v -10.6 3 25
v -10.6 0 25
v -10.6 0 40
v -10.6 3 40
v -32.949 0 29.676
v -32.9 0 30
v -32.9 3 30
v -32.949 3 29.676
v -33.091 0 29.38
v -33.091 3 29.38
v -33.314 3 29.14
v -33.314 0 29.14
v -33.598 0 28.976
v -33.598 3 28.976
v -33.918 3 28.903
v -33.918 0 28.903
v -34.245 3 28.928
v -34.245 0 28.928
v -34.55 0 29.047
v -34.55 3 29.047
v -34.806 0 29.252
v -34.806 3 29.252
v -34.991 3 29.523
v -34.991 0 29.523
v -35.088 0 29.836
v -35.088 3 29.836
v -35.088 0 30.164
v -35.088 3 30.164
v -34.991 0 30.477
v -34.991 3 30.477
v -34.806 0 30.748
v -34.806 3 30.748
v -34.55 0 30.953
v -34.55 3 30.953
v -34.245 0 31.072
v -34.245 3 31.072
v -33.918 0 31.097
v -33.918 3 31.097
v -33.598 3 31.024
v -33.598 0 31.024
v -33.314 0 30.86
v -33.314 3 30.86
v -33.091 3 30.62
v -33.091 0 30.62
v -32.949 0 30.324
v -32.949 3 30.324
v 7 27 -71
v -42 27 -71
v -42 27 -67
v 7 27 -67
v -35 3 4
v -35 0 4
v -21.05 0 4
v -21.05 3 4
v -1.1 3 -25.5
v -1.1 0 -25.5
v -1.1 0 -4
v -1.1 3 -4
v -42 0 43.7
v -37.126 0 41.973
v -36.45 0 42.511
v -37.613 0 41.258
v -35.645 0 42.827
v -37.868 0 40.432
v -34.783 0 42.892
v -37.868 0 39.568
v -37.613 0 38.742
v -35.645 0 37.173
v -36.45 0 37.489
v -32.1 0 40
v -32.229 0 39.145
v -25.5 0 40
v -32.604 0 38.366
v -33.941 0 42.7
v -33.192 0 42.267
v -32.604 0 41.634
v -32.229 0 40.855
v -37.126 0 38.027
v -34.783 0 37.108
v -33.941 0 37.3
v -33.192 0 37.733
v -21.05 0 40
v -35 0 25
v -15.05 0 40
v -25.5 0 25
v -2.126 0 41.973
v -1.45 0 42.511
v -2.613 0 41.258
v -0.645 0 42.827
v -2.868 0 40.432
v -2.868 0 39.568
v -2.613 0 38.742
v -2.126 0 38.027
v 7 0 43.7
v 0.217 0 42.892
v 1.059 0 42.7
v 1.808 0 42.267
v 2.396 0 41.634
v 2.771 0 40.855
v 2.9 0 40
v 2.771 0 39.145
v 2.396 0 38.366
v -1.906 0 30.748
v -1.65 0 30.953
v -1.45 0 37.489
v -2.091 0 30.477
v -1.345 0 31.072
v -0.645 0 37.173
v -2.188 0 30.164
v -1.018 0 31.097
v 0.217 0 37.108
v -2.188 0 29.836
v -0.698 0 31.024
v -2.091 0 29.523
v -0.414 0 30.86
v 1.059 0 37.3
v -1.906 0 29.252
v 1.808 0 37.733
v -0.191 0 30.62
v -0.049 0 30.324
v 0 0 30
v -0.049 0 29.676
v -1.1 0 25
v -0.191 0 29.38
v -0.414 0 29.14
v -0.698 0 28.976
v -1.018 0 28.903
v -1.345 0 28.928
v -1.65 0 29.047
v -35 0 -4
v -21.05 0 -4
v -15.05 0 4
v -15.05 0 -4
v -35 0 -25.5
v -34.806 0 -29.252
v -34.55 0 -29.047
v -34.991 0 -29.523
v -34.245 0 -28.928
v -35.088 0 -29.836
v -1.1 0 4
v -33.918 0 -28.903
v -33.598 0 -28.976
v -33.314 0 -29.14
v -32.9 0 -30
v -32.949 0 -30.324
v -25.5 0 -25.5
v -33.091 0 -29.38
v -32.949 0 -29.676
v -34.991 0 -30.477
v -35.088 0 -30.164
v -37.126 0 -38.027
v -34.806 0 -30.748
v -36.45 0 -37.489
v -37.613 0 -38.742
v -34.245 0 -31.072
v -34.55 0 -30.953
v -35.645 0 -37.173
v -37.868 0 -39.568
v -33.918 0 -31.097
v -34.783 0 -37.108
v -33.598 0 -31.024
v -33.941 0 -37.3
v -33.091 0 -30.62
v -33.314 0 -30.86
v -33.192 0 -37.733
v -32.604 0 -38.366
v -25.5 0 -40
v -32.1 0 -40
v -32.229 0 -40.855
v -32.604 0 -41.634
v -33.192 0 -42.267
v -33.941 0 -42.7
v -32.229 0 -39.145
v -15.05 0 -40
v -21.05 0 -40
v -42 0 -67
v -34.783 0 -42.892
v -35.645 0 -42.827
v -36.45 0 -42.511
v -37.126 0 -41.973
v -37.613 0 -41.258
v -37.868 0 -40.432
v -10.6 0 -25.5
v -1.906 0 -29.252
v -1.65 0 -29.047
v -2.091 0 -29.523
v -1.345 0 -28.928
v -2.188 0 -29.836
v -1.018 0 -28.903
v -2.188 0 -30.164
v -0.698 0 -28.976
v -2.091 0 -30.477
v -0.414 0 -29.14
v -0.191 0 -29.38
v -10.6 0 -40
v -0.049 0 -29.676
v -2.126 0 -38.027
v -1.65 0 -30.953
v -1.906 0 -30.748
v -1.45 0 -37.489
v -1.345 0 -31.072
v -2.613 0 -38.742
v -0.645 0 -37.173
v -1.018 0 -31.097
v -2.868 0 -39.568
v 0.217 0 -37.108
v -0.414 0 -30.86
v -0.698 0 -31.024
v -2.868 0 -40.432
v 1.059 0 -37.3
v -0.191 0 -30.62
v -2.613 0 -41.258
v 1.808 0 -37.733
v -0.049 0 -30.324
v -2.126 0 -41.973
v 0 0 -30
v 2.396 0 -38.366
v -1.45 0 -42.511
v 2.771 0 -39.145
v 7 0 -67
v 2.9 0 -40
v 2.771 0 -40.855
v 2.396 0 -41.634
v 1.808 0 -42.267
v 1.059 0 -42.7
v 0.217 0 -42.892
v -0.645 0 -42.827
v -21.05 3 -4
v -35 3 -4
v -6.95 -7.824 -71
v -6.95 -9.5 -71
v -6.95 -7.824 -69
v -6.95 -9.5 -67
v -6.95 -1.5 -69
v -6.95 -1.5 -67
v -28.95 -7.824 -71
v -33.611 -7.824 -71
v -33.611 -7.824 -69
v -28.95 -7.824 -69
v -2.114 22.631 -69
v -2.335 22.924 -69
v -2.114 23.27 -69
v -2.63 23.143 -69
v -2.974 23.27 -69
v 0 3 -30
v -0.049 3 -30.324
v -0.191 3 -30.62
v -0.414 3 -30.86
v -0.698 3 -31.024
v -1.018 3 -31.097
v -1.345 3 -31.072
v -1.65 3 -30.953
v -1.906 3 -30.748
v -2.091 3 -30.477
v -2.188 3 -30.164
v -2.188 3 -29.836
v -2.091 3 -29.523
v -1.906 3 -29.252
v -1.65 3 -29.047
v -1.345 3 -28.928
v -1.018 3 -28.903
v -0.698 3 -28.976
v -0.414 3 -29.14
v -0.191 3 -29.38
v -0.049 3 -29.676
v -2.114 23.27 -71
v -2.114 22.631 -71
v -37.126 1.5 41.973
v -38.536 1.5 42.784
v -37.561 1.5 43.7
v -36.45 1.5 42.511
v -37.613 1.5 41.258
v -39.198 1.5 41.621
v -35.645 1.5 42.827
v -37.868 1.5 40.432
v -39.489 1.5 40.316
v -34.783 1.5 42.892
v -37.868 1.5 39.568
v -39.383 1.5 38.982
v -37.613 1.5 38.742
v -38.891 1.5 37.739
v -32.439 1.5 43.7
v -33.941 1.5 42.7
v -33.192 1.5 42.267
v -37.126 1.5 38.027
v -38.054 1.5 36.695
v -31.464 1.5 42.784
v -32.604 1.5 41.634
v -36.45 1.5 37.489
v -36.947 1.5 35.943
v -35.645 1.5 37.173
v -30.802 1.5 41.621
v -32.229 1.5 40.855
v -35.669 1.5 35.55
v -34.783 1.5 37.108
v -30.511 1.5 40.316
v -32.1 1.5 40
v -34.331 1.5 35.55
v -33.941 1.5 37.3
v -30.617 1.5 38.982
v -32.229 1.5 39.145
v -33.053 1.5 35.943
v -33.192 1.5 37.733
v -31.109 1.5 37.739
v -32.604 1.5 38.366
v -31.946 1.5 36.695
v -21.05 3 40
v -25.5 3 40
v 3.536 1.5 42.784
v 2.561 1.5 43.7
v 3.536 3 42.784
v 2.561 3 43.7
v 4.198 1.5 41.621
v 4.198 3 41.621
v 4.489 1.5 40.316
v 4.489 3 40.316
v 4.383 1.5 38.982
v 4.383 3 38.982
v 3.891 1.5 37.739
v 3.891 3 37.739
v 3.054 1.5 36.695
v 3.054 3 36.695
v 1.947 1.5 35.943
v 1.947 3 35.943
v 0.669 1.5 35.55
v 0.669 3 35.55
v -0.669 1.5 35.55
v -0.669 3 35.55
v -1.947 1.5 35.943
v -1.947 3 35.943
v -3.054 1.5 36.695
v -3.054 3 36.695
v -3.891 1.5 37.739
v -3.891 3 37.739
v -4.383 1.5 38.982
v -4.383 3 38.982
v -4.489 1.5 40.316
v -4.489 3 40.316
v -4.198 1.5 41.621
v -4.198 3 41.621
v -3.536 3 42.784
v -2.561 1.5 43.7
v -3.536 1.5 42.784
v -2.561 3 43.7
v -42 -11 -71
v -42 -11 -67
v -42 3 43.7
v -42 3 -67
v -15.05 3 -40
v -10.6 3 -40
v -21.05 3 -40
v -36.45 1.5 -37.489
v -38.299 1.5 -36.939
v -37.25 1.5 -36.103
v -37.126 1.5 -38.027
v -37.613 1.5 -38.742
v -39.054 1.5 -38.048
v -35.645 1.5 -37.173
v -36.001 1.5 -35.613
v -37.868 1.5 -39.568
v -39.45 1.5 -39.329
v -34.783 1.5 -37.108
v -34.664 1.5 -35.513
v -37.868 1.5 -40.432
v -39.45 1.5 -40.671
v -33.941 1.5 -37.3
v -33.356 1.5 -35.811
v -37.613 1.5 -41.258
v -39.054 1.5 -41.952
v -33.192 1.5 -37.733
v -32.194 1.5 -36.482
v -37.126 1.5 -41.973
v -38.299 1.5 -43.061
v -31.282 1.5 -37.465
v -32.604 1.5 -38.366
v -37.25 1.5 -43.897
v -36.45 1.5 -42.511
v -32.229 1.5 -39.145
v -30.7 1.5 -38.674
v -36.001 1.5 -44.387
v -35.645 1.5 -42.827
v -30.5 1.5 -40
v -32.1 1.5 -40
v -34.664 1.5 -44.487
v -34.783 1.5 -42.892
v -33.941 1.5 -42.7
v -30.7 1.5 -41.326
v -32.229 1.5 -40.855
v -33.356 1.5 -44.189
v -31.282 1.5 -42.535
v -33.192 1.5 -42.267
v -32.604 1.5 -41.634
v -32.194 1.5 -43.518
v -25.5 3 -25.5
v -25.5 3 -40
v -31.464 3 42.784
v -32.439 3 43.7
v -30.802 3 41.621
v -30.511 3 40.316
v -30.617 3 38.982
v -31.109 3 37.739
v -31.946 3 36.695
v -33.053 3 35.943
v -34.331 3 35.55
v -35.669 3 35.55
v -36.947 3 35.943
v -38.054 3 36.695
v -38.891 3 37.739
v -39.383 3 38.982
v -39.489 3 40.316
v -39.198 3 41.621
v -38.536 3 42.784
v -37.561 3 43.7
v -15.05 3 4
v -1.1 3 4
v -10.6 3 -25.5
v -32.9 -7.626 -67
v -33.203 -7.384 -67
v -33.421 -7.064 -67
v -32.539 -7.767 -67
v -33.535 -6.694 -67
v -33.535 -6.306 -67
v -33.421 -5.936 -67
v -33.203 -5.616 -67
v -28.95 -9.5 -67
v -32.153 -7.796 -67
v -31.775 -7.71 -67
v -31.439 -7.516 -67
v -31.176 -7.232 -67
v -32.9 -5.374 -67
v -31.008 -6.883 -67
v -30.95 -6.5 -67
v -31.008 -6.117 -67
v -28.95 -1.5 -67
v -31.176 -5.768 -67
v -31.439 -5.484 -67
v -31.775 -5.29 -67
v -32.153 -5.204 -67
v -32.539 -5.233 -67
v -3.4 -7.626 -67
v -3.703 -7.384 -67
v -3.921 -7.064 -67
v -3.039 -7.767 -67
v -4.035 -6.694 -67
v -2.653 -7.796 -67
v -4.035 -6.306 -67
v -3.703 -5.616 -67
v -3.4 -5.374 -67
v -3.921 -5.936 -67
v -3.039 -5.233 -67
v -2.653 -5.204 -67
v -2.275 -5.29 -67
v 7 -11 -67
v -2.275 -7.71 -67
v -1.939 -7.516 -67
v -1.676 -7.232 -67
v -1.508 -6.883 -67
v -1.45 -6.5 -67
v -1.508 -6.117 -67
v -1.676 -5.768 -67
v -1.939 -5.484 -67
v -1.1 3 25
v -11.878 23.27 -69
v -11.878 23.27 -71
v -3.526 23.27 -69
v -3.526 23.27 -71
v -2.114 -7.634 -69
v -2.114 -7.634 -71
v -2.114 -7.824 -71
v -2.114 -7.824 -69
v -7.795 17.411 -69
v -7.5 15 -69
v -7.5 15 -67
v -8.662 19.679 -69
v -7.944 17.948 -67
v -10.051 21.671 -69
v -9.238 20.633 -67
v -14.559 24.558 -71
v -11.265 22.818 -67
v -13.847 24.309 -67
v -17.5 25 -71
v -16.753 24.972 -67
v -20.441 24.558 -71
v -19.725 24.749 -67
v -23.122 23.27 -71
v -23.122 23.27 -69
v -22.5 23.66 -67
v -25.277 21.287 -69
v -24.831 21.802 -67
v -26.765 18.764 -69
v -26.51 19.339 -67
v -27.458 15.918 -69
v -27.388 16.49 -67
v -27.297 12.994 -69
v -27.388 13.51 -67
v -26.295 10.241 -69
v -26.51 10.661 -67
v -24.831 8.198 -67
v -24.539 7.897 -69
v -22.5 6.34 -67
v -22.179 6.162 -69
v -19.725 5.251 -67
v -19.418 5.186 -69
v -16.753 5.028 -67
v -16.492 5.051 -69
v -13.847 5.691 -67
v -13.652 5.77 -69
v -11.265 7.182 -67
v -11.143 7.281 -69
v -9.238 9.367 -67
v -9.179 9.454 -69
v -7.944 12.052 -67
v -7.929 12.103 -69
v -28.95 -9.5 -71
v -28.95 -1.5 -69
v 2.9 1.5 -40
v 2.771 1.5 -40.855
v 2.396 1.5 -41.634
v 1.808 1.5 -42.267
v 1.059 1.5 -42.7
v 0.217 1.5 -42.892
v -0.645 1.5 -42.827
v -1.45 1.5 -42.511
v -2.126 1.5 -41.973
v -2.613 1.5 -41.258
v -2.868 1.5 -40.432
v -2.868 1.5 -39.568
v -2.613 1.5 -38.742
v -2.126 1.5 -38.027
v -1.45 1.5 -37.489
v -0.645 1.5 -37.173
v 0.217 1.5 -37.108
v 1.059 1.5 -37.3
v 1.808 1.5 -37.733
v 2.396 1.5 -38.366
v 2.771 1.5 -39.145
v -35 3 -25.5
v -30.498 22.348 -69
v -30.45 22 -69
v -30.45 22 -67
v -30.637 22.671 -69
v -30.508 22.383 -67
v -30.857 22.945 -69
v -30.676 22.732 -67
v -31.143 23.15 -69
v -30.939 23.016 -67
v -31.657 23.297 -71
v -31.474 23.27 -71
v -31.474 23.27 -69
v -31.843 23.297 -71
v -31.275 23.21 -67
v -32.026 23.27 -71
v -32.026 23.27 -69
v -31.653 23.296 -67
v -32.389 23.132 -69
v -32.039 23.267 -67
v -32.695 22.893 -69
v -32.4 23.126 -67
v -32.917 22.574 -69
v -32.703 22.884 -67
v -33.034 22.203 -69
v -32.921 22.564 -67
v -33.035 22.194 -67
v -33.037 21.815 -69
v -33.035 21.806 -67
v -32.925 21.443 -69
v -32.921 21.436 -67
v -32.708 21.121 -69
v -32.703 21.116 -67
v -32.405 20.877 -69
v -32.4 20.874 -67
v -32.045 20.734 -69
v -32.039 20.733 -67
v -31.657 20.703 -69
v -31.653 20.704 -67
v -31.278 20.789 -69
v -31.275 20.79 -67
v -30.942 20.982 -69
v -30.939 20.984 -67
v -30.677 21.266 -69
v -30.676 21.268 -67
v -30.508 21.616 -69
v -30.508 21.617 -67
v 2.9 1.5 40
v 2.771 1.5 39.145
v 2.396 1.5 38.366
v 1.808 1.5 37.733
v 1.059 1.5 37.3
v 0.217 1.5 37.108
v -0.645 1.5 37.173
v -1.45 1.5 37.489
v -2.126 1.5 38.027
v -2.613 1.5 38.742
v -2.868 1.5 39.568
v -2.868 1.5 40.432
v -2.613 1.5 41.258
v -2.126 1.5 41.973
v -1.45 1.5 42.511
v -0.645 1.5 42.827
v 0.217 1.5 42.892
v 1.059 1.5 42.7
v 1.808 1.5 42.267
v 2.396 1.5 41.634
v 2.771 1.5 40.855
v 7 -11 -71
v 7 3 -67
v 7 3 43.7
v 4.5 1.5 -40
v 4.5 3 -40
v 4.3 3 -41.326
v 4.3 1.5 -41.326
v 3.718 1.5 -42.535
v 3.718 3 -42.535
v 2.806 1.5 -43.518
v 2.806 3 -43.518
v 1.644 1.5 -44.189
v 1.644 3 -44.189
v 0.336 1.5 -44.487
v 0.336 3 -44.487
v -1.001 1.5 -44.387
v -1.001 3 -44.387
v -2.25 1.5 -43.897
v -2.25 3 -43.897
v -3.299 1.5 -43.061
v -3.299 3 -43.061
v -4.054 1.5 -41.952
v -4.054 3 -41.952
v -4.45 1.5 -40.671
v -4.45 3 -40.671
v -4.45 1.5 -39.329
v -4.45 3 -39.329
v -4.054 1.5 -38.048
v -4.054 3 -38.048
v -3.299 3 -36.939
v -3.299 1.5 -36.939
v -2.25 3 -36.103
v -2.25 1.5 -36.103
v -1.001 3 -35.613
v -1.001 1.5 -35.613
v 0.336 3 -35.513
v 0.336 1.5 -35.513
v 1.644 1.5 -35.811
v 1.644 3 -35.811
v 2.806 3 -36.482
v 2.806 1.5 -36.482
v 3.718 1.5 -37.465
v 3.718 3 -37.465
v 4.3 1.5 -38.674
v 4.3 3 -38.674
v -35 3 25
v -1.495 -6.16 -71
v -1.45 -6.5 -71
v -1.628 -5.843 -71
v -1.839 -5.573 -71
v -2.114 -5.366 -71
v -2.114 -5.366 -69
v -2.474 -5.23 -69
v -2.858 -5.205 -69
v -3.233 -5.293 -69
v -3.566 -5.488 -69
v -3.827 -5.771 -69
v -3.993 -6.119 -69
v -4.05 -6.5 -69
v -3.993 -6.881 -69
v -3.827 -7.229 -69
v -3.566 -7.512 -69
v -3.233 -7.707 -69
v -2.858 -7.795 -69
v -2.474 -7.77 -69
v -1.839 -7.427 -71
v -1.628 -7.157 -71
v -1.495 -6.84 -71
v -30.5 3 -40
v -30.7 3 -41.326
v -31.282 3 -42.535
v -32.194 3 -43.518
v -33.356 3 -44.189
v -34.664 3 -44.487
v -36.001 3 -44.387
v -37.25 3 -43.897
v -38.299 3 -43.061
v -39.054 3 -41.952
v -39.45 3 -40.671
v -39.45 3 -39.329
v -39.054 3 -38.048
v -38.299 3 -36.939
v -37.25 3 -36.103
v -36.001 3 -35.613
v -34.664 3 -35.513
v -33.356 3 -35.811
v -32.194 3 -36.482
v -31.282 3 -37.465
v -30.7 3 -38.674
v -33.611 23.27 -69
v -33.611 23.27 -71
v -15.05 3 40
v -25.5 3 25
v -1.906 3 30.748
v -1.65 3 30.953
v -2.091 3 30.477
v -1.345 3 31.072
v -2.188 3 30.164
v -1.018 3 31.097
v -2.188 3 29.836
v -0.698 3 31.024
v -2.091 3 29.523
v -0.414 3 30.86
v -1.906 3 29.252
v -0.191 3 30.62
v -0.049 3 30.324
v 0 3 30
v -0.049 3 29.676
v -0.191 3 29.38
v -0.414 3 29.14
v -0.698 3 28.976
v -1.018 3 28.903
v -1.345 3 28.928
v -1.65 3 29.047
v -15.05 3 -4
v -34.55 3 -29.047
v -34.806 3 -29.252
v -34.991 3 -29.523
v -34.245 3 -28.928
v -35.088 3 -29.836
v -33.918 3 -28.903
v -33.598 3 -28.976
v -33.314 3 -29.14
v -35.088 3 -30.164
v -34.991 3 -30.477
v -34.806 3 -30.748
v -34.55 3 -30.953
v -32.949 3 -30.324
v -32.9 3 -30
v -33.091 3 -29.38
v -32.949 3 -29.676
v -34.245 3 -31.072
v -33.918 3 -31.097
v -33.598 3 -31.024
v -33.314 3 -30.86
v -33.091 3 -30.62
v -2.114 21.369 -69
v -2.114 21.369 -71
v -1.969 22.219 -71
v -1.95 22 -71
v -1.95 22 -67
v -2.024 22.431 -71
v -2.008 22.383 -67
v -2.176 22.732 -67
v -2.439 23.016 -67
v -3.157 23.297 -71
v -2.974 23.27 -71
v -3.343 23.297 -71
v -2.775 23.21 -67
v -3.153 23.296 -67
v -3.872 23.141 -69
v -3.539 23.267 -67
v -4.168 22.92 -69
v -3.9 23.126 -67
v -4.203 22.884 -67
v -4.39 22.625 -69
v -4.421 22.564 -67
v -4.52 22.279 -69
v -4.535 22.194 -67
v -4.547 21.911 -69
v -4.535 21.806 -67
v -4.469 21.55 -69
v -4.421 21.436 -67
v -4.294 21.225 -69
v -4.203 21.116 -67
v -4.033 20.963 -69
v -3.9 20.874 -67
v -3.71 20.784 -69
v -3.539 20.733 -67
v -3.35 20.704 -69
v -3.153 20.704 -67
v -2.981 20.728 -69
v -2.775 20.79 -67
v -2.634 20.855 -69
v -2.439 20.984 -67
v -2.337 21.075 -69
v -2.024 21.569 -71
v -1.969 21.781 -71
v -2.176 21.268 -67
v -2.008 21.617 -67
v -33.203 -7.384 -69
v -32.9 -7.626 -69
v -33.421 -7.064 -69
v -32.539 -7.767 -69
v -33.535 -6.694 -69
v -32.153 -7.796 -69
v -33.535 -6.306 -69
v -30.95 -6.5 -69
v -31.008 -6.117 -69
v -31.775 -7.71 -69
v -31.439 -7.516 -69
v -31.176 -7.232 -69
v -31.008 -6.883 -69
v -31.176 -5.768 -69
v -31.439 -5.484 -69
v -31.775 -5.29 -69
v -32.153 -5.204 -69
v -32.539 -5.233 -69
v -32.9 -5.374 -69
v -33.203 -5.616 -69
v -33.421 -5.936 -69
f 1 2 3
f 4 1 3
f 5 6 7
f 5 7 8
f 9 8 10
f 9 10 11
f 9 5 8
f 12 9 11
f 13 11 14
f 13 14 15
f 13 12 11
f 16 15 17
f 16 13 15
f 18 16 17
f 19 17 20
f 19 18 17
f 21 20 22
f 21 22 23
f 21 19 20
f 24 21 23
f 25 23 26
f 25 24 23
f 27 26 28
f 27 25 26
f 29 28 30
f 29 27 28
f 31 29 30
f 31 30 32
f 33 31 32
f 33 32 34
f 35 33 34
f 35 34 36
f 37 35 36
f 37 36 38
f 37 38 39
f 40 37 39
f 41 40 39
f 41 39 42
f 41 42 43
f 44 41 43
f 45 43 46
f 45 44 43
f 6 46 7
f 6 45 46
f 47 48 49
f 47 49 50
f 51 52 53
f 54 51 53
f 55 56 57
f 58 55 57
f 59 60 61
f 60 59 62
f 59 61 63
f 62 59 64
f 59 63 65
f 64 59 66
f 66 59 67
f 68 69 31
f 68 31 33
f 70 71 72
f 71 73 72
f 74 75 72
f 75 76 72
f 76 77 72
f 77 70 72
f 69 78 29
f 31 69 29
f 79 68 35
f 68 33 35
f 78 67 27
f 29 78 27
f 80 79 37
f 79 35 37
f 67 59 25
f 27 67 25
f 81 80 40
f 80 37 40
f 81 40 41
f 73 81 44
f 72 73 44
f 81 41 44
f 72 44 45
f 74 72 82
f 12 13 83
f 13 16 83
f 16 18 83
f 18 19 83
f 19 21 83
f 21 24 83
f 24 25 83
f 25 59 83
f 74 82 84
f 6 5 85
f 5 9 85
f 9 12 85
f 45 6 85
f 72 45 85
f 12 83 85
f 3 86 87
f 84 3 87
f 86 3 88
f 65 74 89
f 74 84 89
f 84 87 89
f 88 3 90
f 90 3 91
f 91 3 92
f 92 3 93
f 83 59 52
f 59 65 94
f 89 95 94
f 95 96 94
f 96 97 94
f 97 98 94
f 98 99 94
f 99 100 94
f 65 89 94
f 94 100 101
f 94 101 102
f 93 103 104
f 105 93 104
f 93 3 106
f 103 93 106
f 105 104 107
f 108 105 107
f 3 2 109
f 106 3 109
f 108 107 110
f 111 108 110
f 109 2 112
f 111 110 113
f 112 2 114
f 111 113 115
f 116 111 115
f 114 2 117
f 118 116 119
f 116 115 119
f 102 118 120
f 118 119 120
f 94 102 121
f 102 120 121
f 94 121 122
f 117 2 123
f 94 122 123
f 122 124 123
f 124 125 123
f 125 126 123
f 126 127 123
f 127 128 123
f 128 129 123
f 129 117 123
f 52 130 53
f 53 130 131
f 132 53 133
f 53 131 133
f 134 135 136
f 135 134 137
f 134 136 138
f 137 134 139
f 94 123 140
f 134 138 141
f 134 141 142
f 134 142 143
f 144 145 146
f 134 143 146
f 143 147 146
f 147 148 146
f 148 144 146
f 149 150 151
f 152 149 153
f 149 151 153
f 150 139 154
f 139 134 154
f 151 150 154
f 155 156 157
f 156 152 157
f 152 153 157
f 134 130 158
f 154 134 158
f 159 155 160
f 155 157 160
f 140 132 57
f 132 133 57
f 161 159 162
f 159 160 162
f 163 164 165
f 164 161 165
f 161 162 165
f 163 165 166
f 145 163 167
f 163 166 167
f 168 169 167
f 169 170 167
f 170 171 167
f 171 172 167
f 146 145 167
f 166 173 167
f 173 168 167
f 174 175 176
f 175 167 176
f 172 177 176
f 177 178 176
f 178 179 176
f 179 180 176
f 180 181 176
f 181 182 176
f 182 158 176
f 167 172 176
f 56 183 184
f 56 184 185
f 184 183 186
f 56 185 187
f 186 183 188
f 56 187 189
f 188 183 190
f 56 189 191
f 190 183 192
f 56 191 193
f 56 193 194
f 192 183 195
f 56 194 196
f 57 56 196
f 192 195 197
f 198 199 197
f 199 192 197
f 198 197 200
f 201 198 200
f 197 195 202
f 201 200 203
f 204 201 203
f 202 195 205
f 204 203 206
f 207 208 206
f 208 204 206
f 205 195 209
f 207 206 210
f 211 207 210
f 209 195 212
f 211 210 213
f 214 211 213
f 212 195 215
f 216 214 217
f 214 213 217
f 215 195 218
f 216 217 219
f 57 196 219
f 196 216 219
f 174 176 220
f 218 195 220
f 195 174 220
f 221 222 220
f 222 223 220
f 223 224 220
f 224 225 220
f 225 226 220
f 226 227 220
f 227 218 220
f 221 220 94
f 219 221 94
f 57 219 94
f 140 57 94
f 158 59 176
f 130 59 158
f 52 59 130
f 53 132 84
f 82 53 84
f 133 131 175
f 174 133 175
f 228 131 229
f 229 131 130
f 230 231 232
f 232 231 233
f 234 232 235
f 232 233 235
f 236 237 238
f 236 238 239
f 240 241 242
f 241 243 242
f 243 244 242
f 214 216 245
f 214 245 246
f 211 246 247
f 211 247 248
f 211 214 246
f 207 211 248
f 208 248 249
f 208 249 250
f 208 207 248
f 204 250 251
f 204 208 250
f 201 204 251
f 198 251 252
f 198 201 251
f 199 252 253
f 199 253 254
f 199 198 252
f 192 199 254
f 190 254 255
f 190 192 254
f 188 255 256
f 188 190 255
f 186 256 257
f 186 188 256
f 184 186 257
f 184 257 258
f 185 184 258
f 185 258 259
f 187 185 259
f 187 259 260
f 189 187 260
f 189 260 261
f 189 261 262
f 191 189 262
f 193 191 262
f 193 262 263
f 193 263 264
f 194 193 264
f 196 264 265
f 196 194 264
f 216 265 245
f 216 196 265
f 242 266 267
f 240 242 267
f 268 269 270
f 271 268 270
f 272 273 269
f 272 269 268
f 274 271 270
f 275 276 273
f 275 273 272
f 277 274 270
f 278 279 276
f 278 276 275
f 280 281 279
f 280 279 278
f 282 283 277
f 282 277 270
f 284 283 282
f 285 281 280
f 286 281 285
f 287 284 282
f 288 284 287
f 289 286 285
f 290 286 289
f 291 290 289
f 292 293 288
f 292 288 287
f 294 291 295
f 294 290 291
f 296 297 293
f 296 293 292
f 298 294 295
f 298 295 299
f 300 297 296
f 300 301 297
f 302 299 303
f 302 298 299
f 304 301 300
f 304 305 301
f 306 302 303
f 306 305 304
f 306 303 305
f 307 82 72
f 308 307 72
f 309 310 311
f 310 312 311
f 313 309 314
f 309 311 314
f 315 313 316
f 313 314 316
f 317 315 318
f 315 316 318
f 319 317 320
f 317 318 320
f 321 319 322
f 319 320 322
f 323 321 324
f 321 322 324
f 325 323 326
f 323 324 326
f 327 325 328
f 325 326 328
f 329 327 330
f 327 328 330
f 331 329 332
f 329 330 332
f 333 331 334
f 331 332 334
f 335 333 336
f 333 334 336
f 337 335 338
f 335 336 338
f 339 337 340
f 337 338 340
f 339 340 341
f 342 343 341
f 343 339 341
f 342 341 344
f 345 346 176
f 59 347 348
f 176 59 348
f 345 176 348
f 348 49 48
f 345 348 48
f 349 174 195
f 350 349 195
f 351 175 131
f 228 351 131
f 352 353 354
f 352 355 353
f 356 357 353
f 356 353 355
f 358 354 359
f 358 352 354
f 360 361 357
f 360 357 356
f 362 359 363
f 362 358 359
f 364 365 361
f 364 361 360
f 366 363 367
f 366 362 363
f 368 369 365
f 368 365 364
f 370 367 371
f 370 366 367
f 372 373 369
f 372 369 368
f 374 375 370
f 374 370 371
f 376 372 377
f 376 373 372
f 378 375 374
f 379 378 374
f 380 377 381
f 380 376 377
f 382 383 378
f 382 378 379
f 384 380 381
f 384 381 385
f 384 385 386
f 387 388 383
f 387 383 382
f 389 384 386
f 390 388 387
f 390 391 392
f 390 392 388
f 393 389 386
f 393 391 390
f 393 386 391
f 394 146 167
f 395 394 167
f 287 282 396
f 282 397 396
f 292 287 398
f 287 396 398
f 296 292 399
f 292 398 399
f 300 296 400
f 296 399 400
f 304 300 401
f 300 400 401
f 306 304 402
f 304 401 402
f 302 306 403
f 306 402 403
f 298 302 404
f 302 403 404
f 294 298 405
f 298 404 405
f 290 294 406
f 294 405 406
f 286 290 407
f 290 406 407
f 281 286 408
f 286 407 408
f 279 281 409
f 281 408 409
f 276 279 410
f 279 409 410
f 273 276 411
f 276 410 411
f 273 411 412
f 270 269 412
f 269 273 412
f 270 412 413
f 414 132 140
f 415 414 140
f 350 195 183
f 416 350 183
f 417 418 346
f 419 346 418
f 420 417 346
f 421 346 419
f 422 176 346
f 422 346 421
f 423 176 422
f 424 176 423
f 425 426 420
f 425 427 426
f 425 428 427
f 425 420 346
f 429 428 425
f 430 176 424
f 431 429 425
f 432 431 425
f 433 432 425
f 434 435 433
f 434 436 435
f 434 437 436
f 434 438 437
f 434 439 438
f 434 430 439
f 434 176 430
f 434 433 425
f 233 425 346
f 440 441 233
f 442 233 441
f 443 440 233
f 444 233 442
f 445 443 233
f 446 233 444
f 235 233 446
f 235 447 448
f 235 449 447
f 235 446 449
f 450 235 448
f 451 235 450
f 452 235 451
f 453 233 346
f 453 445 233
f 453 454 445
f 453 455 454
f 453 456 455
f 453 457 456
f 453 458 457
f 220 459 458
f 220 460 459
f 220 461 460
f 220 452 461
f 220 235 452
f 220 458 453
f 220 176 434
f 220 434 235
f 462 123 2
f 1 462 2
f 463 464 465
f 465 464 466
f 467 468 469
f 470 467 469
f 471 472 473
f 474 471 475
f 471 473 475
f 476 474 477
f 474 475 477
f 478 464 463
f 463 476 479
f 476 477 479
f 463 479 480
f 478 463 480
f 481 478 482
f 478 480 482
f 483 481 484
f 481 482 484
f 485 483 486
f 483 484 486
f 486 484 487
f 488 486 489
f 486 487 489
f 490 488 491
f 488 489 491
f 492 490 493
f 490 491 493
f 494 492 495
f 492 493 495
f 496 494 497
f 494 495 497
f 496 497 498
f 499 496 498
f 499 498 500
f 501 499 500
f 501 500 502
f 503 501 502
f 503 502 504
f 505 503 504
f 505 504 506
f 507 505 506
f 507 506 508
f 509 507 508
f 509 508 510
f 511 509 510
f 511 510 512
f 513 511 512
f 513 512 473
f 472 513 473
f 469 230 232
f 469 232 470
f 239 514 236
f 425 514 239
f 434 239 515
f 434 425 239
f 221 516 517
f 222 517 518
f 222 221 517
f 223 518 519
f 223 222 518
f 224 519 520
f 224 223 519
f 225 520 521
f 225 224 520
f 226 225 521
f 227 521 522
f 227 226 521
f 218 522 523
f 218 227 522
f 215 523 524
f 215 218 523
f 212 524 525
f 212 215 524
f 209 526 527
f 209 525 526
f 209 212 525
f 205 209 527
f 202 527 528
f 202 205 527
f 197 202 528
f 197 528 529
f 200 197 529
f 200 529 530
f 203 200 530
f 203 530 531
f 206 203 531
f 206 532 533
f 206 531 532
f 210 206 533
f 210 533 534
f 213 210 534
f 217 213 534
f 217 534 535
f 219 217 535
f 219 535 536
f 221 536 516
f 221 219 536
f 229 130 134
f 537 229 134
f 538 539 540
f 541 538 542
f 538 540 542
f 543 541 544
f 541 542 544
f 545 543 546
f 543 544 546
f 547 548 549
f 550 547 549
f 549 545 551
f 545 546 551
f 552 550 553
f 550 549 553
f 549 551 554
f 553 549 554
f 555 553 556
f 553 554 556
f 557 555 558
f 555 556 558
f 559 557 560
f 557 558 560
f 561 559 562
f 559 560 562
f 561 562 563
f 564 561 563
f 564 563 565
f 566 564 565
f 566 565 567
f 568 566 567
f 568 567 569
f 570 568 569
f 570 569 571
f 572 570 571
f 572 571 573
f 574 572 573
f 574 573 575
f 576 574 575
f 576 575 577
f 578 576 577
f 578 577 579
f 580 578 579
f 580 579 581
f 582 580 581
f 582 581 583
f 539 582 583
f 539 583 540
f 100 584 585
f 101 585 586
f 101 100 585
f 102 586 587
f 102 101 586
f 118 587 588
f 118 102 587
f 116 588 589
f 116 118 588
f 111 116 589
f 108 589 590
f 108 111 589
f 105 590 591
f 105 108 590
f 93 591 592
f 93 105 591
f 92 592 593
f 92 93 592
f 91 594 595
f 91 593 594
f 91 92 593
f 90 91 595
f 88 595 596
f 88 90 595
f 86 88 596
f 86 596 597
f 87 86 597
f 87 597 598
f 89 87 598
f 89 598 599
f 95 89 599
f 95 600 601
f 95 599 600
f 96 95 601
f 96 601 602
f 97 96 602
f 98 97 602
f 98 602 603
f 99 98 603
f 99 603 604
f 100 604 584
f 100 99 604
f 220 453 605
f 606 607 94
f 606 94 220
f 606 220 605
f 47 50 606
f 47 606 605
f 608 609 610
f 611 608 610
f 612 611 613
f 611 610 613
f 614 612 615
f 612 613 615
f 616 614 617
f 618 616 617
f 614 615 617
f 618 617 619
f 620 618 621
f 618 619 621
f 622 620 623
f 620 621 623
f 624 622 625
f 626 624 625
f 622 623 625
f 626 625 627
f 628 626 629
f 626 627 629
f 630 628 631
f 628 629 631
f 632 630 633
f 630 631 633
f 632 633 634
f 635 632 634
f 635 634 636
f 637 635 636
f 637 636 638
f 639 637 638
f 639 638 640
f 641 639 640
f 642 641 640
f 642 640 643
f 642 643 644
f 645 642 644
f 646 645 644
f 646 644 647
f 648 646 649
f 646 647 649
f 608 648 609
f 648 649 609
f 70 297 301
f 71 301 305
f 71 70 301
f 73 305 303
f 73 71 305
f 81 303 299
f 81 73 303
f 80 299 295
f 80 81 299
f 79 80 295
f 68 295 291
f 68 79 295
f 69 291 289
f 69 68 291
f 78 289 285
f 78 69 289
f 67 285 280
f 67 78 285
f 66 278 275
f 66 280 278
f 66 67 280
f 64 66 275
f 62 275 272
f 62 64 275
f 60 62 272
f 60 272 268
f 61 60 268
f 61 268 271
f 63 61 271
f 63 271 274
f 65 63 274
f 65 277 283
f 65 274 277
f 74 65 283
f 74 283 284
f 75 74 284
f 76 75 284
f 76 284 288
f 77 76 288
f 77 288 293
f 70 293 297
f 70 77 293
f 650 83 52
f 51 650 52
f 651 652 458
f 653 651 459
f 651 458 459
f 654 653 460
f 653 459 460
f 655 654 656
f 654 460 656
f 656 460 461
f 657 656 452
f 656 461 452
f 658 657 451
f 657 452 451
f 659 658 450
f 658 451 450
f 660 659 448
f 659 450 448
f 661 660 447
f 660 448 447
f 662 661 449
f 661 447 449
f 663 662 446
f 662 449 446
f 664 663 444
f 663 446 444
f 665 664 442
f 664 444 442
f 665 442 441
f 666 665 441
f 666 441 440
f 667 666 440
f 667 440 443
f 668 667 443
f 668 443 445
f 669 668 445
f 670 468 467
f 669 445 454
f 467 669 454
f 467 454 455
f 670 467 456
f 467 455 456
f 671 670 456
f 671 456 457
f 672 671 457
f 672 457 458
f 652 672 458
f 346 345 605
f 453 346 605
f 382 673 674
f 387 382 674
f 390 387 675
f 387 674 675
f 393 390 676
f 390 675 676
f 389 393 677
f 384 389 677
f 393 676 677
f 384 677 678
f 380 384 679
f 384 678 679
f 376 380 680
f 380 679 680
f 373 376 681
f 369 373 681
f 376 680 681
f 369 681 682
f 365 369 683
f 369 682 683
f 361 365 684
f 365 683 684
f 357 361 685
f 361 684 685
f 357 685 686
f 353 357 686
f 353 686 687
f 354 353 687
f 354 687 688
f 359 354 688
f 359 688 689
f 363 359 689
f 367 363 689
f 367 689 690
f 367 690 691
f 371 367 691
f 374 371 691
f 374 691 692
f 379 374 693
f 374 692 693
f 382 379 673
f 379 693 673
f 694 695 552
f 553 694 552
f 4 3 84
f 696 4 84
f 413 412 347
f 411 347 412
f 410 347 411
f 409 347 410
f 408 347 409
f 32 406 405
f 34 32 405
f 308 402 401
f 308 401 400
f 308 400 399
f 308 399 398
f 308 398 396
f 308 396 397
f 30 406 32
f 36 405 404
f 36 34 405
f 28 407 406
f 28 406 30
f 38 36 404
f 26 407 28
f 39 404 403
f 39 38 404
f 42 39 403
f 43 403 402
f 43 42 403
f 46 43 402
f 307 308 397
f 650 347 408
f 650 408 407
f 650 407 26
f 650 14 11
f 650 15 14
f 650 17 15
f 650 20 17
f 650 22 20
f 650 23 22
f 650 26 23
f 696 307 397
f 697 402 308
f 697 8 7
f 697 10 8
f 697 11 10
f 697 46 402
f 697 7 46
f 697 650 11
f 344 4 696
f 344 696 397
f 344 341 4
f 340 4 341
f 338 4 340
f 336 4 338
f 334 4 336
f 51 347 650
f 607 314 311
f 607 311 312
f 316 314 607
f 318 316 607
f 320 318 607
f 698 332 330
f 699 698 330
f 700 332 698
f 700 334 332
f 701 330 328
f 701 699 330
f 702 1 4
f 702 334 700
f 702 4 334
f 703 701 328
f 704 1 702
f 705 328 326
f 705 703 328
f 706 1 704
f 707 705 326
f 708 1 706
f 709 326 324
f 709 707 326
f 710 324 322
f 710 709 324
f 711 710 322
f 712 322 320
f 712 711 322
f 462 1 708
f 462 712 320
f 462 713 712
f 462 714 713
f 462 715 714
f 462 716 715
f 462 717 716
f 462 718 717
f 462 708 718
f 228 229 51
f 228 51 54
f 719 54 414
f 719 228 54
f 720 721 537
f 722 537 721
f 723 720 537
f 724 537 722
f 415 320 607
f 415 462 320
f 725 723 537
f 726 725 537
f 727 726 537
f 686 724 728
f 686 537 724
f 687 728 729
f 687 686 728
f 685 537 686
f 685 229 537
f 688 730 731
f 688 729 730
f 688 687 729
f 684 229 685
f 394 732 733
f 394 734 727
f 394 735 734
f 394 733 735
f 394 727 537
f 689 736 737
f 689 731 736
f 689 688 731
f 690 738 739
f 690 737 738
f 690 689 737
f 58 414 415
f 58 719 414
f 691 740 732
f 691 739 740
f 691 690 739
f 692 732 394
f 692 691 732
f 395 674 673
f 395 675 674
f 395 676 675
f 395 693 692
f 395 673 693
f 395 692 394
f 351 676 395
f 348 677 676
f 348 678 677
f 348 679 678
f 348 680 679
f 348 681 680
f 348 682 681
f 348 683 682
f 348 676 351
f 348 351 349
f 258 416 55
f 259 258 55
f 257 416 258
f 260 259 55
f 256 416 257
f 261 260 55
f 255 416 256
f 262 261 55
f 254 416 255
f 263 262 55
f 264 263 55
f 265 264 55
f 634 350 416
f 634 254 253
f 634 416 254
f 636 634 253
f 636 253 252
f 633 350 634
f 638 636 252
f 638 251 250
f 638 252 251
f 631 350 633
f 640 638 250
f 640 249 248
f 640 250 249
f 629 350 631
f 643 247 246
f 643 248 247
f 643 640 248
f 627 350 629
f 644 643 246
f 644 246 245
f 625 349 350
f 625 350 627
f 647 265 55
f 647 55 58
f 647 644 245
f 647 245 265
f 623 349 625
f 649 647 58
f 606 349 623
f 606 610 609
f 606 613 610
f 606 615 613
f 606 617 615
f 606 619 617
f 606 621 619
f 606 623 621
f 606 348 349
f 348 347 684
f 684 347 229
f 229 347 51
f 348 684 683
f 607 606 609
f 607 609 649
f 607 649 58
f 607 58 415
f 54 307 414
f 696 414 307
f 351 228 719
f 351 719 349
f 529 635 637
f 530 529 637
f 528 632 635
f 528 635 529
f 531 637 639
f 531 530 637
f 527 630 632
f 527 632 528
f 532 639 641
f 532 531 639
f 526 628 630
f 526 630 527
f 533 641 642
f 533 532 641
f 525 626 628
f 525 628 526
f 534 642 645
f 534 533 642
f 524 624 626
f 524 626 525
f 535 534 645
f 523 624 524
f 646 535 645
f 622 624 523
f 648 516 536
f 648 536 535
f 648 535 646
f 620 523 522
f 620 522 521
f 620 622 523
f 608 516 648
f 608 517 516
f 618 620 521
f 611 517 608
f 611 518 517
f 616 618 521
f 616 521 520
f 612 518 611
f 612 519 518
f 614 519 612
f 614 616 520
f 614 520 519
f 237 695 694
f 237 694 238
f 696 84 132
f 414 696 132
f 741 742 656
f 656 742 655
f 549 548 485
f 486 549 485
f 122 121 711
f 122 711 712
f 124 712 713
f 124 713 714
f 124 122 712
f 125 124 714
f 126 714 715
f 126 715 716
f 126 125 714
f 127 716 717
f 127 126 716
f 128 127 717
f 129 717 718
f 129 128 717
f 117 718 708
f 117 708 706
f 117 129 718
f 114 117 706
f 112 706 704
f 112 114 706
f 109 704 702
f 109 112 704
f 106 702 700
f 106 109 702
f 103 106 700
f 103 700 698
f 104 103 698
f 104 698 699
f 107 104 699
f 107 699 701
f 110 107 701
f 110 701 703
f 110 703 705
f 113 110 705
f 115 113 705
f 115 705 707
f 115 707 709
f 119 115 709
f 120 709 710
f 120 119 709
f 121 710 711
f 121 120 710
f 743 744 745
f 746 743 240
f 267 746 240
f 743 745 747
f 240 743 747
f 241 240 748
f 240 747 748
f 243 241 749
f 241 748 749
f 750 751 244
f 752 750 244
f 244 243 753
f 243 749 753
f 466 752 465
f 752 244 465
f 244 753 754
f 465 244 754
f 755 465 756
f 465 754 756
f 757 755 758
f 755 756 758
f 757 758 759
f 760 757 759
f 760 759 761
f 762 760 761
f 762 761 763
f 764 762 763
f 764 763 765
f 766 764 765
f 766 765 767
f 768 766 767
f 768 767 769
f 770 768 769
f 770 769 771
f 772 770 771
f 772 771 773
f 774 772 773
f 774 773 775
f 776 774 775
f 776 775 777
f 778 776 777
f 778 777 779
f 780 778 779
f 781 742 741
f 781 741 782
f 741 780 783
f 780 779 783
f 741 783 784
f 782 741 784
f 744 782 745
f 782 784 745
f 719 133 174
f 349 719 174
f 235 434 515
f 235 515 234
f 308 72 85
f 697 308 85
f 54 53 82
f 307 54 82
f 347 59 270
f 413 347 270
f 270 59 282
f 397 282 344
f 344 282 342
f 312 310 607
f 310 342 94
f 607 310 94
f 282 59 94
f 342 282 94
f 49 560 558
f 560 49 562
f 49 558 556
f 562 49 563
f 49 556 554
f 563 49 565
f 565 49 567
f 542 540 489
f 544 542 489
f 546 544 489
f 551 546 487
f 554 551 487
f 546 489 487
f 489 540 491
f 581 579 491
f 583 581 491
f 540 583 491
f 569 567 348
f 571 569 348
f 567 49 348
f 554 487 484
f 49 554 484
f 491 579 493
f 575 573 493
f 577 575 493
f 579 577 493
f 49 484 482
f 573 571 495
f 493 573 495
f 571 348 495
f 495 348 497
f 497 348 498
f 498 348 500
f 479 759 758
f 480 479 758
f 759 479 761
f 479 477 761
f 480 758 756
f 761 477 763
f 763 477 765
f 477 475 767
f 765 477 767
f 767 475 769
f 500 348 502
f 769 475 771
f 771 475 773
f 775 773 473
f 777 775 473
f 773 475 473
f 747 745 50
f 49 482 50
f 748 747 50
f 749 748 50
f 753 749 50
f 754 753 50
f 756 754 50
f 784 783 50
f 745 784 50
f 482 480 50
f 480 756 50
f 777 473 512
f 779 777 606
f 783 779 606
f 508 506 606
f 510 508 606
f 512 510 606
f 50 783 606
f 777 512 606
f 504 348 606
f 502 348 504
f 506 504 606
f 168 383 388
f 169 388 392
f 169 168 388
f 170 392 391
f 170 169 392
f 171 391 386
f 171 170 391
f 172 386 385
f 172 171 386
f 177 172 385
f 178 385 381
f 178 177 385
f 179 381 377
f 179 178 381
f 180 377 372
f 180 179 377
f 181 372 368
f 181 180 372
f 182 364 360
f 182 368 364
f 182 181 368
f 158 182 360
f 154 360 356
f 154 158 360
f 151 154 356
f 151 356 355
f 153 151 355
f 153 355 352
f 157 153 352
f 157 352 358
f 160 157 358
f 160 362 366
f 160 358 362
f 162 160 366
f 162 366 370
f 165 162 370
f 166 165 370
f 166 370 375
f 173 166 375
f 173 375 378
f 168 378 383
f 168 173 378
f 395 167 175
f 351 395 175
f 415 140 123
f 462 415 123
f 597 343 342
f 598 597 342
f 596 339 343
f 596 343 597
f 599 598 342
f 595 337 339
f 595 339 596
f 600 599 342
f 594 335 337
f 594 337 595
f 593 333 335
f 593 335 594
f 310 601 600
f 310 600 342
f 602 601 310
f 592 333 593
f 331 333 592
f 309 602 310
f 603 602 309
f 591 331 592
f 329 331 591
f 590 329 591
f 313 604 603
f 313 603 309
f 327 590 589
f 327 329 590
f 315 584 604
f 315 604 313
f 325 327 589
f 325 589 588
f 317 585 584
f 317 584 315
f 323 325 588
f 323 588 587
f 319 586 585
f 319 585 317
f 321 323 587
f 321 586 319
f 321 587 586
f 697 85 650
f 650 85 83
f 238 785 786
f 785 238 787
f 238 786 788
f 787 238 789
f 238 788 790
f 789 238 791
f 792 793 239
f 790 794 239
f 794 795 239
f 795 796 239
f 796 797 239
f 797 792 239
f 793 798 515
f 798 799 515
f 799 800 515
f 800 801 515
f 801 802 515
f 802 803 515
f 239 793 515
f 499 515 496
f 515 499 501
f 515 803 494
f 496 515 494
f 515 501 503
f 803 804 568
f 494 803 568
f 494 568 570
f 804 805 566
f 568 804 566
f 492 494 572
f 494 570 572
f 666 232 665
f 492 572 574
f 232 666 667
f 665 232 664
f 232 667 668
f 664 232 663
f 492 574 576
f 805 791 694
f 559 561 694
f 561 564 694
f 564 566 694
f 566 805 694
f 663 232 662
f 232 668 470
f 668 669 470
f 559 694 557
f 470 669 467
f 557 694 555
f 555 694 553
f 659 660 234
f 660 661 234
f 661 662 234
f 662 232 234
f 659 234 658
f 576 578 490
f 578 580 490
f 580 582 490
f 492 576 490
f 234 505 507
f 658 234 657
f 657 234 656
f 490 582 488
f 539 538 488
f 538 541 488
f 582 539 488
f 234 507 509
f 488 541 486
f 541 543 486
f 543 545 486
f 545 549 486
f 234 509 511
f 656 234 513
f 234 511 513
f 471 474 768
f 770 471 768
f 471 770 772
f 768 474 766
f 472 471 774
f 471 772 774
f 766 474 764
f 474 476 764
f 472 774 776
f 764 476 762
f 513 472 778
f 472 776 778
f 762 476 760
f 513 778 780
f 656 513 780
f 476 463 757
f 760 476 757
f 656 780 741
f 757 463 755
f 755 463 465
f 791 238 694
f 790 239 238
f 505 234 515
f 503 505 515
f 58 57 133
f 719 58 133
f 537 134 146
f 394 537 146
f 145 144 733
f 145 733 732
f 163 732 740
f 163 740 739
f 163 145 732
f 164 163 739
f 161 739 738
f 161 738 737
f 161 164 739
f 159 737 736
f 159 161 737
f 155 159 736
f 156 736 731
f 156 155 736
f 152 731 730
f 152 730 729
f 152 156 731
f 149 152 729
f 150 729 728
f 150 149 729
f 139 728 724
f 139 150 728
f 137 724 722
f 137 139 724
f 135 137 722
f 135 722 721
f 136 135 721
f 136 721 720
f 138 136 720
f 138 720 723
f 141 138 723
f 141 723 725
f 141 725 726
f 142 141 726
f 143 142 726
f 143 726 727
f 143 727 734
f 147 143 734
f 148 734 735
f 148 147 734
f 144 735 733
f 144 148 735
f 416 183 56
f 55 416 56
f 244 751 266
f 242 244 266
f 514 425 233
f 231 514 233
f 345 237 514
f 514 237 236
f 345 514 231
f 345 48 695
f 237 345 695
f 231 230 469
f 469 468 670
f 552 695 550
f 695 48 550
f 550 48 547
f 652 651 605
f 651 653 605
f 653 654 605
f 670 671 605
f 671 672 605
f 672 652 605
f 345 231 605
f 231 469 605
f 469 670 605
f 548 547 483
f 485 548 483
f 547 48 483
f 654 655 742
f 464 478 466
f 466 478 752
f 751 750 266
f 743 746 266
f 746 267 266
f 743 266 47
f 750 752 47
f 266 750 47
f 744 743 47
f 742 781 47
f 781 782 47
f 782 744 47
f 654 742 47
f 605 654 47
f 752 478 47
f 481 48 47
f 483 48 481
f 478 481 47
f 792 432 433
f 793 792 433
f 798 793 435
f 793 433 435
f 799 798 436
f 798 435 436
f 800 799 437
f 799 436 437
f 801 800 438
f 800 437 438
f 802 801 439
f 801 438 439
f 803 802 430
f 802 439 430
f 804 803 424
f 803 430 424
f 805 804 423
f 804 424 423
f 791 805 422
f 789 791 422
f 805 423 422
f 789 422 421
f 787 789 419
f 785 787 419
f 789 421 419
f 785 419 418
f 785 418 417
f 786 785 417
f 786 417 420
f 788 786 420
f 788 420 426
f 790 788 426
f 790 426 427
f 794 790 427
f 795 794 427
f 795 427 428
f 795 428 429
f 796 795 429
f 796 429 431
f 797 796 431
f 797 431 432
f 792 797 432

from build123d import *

# Parameters (mm, degrees)
SKETCH_1_R           = 2.9
SKETCH_1_R_2         = 1.1
EXTRUDE_1_DEPTH      = 3
SKETCH_2_R           = 4.5
CUT_EXTRUDE_1_DEPTH  = 1.5
SKETCH_3_W           = 49
SKETCH_3_H           = 4
EXTRUDE_2_DEPTH      = 24
EXTRUDE_2_DEPTH_BACK = 14
SKETCH_4_W           = 22
SKETCH_4_H           = 8
SKETCH_4_R           = 1.3
SKETCH_4_R_2         = 10
CUT_EXTRUDE_7_DEPTH  = 5
CUT_EXTRUDE_8_DEPTH  = 2


with BuildPart() as part:
    # 草图1 → 凸台-拉伸1 (new body)
    with BuildSketch(Plane(origin=(0, 0, 0), x_dir=(1, 0, 0), z_dir=(0, 1, 0))):
        Polygon((-42, 50.3), (-42, 3.3), (-42, -43.7), (0, -43.7), (7, -43.7), (7, 47), (7, 67), (-42, 67), align=None)
        with Locations((-35, -40)):
            Circle(SKETCH_1_R, mode=Mode.SUBTRACT)
        with Locations((-34, -30)):
            Circle(SKETCH_1_R_2, mode=Mode.SUBTRACT)
        Polygon((-35, -25), (-35, -4), (-21.05, -4), (-21.05, -40), (-25.5, -40), (-25.5, -25), align=None, mode=Mode.SUBTRACT)
        Polygon((-1.1, -4), (-1.1, -25), (-10.6, -25), (-10.6, -40), (-15.05, -40), (-15.05, -4), align=None, mode=Mode.SUBTRACT)
        with Locations((0, -40)):
            Circle(SKETCH_1_R, mode=Mode.SUBTRACT)
        with Locations((-1.1, -30)):
            Circle(SKETCH_1_R_2, mode=Mode.SUBTRACT)
        with Locations((-34, 30)):
            Circle(SKETCH_1_R_2, mode=Mode.SUBTRACT)
        Polygon((-21.05, 4), (-35, 4), (-35, 25.5), (-25.5, 25.5), (-25.5, 40), (-21.05, 40), align=None, mode=Mode.SUBTRACT)
        with Locations((-35, 40)):
            Circle(SKETCH_1_R, mode=Mode.SUBTRACT)
        Polygon((-10.6, 25.5), (-1.1, 25.5), (-1.1, 4), (-15.05, 4), (-15.05, 40), (-10.6, 40), align=None, mode=Mode.SUBTRACT)
        with Locations((-1.1, 30)):
            Circle(SKETCH_1_R_2, mode=Mode.SUBTRACT)
        with Locations((0, 40)):
            Circle(SKETCH_1_R, mode=Mode.SUBTRACT)
    extrude(amount=EXTRUDE_1_DEPTH)

    # 草图2 → 切除-拉伸1 (cut)
    with BuildSketch(Plane(origin=(0, 3, 0), x_dir=(1, 0, 0), z_dir=(0, 1, 0))):
        with Locations((-35, 40)):
            Circle(SKETCH_2_R)
        with Locations((0, 40)):
            Circle(SKETCH_2_R)
        with Locations((0, -40)):
            Circle(SKETCH_2_R)
        with Locations((-35, -40)):
            Circle(SKETCH_2_R)
    extrude(amount=-CUT_EXTRUDE_1_DEPTH, mode=Mode.SUBTRACT)

    # 草图3 → 凸台-拉伸2 (add, two sides)
    with BuildSketch(Plane(origin=(0, 3, 0), x_dir=(1, 0, 0), z_dir=(0, 1, 0))) as extrude_2_sk:
        with Locations((-17.5, 69)):
            Rectangle(SKETCH_3_W, SKETCH_3_H)
    extrude(amount=EXTRUDE_2_DEPTH)
    extrude(extrude_2_sk.sketch, amount=-EXTRUDE_2_DEPTH_BACK)

    # 草图4 → 切除-拉伸7 (cut, through all)
    with BuildSketch(Plane.XY.offset(-67)):
        with Locations((-17.95, -5.5)):
            Rectangle(SKETCH_4_W, SKETCH_4_H)
        with Locations((-31.75, 22)):
            Circle(SKETCH_4_R)
        with Locations((-3.25, 22)):
            Circle(SKETCH_4_R)
        with Locations((-2.75, -6.5)):
            Circle(SKETCH_4_R)
        with Locations((-32.25, -6.5)):
            Circle(SKETCH_4_R)
        with Locations((-17.5, 15)):
            Circle(SKETCH_4_R_2)
    extrude(amount=-CUT_EXTRUDE_7_DEPTH, mode=Mode.SUBTRACT)

    # 草图5 → 切除-拉伸8 (cut)
    with BuildSketch(Plane(origin=(0, 0, -71), x_dir=(-1, 0, 0), z_dir=(0, 0, -1))):
        Polygon((2.113595541, 22.631335811), (2.113595541, 23.270329273), (32.026158538, 23.270329273), (33.610999862, 23.270329273), (33.610999862, -7.824323718), (2.113595541, -7.824323718), align=None)
    extrude(amount=-CUT_EXTRUDE_8_DEPTH, mode=Mode.SUBTRACT)


solid = part.part
